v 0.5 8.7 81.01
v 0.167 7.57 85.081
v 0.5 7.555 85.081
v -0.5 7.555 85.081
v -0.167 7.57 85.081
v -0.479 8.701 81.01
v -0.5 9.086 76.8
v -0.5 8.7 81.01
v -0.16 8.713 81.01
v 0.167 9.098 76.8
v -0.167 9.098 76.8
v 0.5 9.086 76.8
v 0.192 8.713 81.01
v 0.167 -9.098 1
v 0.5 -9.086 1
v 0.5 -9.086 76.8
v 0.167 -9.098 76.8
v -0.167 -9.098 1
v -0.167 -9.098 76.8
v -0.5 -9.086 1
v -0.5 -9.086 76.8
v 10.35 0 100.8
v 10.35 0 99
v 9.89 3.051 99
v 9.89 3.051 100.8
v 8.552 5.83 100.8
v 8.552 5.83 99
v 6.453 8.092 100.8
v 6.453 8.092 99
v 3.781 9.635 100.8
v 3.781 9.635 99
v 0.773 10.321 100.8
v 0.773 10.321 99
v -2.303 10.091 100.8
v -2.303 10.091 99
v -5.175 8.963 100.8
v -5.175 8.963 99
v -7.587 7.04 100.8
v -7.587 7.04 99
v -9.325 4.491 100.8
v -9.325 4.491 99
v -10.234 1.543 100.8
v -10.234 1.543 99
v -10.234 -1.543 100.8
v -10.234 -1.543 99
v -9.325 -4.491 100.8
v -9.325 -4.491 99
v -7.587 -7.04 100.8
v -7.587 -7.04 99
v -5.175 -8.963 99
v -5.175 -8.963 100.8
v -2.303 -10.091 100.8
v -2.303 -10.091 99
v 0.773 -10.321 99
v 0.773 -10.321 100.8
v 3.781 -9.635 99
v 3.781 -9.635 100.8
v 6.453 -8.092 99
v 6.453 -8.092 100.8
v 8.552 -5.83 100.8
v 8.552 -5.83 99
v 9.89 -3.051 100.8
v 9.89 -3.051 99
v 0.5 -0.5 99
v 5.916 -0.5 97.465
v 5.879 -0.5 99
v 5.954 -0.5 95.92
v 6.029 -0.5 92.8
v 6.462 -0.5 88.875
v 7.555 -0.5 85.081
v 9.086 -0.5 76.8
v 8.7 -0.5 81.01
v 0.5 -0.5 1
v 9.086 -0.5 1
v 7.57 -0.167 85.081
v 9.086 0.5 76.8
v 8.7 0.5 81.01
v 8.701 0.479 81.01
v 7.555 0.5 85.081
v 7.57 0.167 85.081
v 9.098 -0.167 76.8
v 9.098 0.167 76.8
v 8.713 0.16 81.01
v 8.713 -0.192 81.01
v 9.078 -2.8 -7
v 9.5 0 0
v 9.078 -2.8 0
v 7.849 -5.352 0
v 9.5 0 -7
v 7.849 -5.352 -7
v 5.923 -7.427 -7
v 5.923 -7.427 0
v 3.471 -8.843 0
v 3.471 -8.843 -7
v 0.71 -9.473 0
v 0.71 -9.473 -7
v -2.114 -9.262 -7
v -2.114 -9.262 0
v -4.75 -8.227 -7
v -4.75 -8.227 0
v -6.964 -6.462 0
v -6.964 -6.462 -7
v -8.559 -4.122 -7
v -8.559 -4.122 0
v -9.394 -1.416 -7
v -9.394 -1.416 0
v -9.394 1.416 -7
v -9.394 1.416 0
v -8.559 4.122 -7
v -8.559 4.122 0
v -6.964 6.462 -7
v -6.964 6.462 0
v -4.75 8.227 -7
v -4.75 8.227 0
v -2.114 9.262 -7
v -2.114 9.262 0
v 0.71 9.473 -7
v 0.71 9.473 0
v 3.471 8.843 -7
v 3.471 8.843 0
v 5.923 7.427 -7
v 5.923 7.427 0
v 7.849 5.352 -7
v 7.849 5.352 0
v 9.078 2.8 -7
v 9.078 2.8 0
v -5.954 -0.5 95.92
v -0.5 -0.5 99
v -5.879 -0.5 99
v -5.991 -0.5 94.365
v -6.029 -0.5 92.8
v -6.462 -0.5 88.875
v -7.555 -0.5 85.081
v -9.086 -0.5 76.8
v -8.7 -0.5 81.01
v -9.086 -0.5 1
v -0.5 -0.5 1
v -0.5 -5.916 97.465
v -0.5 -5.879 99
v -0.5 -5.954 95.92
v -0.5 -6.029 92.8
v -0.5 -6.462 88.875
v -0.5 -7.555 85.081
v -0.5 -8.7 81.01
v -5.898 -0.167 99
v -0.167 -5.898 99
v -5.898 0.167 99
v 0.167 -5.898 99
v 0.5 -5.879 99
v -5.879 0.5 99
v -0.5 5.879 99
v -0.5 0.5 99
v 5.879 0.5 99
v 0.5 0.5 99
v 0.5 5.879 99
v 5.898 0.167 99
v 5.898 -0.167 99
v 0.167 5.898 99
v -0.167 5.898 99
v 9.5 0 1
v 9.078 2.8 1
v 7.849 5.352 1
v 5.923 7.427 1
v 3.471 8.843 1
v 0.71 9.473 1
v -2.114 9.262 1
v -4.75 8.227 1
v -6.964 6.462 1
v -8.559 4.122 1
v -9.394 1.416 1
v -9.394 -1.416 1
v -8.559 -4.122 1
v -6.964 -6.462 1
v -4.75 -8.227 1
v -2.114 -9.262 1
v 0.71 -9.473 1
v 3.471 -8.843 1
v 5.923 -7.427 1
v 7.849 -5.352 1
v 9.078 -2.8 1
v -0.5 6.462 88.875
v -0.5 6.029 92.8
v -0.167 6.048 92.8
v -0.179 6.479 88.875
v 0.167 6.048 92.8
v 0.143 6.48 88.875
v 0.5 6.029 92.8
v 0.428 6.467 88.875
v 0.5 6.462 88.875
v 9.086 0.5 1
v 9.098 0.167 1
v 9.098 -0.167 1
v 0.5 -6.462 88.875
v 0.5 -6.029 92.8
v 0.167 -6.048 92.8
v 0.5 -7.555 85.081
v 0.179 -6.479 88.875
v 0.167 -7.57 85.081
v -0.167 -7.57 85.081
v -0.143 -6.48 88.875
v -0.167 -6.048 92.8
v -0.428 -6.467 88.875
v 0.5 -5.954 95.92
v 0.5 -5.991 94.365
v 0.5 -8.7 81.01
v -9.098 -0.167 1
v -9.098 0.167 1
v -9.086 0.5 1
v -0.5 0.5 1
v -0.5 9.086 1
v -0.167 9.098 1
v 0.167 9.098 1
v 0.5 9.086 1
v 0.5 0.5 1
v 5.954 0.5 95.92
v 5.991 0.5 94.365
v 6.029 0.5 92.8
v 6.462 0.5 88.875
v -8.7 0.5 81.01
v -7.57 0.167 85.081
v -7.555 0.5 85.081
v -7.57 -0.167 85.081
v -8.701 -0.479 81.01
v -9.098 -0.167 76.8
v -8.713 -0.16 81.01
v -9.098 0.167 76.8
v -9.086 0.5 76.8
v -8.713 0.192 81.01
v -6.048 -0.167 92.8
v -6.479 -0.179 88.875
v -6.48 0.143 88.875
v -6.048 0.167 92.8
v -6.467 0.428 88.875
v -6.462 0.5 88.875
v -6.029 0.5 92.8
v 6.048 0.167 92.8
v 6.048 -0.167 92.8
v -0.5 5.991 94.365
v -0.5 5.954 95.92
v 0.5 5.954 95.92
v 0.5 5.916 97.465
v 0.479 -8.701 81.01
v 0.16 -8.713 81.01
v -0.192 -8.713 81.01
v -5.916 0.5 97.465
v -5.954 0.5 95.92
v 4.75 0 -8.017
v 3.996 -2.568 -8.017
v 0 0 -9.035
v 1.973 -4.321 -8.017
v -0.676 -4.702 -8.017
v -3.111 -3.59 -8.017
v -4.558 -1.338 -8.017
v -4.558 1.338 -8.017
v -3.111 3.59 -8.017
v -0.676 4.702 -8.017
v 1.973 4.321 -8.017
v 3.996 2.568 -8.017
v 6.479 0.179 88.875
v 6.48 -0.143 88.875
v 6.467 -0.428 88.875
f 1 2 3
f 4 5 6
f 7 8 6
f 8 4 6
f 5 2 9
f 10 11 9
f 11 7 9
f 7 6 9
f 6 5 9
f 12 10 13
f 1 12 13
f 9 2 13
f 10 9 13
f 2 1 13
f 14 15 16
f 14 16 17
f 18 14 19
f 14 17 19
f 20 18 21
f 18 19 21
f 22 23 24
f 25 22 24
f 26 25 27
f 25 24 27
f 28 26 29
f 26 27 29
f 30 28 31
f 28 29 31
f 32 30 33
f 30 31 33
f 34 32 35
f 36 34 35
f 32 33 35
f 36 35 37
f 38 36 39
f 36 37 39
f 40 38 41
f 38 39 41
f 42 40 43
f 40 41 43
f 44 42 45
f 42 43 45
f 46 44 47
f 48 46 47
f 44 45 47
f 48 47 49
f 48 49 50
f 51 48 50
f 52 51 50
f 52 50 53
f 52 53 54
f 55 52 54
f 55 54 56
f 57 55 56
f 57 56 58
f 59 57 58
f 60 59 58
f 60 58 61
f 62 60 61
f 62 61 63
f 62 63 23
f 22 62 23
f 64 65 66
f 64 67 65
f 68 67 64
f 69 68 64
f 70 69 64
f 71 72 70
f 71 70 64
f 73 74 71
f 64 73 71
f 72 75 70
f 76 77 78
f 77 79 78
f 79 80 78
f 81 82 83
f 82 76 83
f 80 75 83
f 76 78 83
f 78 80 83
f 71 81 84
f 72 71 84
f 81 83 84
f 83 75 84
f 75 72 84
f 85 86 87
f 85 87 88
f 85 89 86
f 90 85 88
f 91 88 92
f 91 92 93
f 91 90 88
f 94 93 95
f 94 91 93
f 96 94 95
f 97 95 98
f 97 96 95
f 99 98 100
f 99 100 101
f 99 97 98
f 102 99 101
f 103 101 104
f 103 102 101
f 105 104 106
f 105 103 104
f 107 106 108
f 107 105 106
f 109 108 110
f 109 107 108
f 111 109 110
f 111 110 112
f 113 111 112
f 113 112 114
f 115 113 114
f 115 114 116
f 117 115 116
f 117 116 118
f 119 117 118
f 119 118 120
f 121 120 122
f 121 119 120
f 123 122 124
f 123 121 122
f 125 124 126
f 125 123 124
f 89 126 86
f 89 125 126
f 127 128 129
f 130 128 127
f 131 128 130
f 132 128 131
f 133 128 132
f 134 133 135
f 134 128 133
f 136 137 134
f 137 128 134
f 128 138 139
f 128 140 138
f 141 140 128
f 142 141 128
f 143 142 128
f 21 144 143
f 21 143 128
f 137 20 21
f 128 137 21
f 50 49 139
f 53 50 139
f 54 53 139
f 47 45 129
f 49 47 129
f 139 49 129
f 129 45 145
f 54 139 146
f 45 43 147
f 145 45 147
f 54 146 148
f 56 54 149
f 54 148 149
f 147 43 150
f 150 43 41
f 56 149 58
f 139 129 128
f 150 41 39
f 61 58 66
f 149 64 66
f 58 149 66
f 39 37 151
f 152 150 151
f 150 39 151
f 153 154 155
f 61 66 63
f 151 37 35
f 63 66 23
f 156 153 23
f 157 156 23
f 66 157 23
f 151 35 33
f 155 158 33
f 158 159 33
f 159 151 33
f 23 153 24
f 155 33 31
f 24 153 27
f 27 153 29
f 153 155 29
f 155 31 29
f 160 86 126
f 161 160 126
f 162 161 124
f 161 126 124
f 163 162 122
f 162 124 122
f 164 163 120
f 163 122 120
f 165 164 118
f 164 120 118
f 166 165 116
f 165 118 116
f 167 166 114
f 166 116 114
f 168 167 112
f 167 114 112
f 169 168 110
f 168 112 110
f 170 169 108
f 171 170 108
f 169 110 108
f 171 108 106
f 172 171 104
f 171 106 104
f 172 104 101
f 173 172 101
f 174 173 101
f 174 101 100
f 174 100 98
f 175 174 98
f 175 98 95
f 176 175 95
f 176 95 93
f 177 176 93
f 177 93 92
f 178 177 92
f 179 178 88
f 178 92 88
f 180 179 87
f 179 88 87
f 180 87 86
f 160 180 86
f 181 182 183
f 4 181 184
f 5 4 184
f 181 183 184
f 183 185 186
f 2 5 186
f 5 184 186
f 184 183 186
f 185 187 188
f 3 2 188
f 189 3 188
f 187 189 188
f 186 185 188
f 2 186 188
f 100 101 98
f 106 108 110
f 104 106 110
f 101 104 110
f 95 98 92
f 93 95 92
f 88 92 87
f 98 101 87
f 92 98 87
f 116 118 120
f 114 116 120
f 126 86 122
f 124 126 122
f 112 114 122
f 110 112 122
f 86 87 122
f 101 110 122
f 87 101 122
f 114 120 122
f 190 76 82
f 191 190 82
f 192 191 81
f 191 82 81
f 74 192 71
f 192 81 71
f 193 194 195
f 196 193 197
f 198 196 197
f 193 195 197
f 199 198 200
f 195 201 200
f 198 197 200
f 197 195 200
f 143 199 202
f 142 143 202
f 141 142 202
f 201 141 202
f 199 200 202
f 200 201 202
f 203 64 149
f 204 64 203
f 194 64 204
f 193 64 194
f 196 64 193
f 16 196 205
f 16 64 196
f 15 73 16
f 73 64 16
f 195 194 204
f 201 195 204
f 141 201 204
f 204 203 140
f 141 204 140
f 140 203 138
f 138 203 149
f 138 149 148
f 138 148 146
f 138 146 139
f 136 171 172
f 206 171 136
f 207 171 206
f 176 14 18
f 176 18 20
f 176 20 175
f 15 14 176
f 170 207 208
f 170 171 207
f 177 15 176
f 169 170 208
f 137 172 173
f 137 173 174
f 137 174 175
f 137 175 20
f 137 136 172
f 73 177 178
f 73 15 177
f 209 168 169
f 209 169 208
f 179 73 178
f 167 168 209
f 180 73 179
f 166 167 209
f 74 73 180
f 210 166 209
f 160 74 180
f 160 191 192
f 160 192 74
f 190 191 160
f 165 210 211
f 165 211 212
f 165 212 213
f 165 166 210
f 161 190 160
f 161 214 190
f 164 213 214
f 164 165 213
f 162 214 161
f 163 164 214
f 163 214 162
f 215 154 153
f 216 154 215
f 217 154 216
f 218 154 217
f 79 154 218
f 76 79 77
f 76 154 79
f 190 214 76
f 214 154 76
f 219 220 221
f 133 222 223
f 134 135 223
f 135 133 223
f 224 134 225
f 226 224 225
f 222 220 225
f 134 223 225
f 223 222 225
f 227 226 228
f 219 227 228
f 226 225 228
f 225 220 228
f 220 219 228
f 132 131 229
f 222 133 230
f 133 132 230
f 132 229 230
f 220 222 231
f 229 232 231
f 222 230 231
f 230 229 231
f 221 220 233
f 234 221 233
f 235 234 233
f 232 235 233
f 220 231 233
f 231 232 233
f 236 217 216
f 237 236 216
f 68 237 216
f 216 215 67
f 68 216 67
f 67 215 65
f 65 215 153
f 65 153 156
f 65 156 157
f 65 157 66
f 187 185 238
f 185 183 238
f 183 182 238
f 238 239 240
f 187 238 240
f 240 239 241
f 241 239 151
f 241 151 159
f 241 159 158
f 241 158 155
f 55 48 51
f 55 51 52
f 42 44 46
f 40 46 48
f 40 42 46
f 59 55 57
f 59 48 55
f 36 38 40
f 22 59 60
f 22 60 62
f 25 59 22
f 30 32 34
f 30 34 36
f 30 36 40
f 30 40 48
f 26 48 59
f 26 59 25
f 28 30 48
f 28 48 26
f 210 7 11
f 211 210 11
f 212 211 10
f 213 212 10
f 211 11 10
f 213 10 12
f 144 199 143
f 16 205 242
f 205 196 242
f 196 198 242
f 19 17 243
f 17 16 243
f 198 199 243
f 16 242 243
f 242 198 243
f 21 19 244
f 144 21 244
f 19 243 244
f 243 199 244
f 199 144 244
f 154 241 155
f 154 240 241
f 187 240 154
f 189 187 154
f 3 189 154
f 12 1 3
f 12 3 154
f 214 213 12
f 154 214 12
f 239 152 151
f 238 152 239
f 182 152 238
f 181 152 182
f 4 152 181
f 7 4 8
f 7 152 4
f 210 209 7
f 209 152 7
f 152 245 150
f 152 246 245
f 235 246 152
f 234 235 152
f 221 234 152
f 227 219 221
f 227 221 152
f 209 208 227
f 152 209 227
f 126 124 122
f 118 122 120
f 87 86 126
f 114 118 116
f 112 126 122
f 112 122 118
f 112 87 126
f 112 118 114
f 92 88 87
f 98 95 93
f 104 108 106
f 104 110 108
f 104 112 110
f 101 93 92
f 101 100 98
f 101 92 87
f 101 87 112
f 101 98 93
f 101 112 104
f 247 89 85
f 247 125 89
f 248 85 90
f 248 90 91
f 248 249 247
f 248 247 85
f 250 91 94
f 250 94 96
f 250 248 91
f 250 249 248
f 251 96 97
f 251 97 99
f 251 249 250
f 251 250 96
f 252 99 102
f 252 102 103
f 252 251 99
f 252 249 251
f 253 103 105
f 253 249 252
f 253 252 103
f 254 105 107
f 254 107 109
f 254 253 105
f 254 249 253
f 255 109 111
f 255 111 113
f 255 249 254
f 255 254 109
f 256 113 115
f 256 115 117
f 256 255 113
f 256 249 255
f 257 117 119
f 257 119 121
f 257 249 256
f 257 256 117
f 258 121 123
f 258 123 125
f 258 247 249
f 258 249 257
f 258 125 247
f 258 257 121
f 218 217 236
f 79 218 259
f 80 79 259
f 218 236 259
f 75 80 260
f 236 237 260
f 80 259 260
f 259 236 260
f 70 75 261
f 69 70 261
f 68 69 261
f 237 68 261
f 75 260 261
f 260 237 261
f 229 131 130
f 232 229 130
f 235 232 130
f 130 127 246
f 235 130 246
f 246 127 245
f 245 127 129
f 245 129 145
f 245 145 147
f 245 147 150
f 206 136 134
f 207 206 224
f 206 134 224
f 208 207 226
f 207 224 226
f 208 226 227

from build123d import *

# Parameters (mm, degrees)
SKETCH1_R           = 9.5
BOSS_EXTRUDE1_DEPTH = 1
BOSS_EXTRUDE2_DEPTH = 98
SKETCH3_R           = 10.35
BOSS_EXTRUDE3_DEPTH = 1.8


with BuildPart() as part:
    # Sketch1 → Boss-Extrude1 (new body)
    with BuildSketch(Plane.XY):
        Circle(SKETCH1_R)
    extrude(amount=BOSS_EXTRUDE1_DEPTH)

    # Sketch2 → Boss-Extrude2 (add)
    with BuildSketch(Plane.XY.offset(1)):
        Polygon((-0.5, 9.1), (0.5, 9.1), (0.5, 0.5), (9.1, 0.5), (9.1, -0.5), (0.5, -0.5), (0.5, -9.1), (-0.5, -9.1), (-0.5, -0.5), (-9.1, -0.5), (-9.1, 0.5), (-0.5, 0.5), align=None)
    extrude(amount=BOSS_EXTRUDE2_DEPTH)

    # Sketch3 → Boss-Extrude3 (add)
    with BuildSketch(Plane.XY.offset(99)):
        Circle(SKETCH3_R)
    extrude(amount=BOSS_EXTRUDE3_DEPTH)

    # Sketch4 → Cut-Revolve1 (revolve, cut)
    with BuildSketch(Plane(origin=(0, 0, 0), x_dir=(0, 0, -1), z_dir=(1, 0, 0))):
        with BuildLine():
            Line((-99, 5.9), (-99, 9.1))
            Line((-99, 9.1), (-99, 10.35))
            Line((-99, 10.35), (-1, 10.35))
            Line((-1, 10.35), (-1, 9.1))
            Line((-1, 9.1), (-76.8, 9.1))
            ThreePointArc((-76.8, 9.1), (-81.01018846, 8.714701704), (-85.080505008, 7.571607291))
            ThreePointArc((-85.080505008, 7.571607291), (-88.875263794, 6.481099639), (-92.8, 6.05))
            Line((-92.8, 6.05), (-99, 5.9))
        make_face()
    revolve(axis=Axis((0, 0, 99), (0, 0, -1)), mode=Mode.SUBTRACT)


with BuildPart() as body_2:
    # Sketch6 → Revolve1 (revolve)
    with BuildSketch(Plane(origin=(0, 0, 0), x_dir=(0, 0, -1), z_dir=(1, 0, 0)), mode=Mode.PRIVATE) as revolve1_sk:
        Polygon((0, 0), (0, 9.5), (7, 9.5), (9.034889329, 0), align=None)
    revolve(revolve1_sk.sketch.rotate(Axis((0, 0, 0), (0, 0, -1)), 90), axis=Axis((0, 0, 0), (0, 0, -1)))


solid = Compound([part.part, body_2.part])
